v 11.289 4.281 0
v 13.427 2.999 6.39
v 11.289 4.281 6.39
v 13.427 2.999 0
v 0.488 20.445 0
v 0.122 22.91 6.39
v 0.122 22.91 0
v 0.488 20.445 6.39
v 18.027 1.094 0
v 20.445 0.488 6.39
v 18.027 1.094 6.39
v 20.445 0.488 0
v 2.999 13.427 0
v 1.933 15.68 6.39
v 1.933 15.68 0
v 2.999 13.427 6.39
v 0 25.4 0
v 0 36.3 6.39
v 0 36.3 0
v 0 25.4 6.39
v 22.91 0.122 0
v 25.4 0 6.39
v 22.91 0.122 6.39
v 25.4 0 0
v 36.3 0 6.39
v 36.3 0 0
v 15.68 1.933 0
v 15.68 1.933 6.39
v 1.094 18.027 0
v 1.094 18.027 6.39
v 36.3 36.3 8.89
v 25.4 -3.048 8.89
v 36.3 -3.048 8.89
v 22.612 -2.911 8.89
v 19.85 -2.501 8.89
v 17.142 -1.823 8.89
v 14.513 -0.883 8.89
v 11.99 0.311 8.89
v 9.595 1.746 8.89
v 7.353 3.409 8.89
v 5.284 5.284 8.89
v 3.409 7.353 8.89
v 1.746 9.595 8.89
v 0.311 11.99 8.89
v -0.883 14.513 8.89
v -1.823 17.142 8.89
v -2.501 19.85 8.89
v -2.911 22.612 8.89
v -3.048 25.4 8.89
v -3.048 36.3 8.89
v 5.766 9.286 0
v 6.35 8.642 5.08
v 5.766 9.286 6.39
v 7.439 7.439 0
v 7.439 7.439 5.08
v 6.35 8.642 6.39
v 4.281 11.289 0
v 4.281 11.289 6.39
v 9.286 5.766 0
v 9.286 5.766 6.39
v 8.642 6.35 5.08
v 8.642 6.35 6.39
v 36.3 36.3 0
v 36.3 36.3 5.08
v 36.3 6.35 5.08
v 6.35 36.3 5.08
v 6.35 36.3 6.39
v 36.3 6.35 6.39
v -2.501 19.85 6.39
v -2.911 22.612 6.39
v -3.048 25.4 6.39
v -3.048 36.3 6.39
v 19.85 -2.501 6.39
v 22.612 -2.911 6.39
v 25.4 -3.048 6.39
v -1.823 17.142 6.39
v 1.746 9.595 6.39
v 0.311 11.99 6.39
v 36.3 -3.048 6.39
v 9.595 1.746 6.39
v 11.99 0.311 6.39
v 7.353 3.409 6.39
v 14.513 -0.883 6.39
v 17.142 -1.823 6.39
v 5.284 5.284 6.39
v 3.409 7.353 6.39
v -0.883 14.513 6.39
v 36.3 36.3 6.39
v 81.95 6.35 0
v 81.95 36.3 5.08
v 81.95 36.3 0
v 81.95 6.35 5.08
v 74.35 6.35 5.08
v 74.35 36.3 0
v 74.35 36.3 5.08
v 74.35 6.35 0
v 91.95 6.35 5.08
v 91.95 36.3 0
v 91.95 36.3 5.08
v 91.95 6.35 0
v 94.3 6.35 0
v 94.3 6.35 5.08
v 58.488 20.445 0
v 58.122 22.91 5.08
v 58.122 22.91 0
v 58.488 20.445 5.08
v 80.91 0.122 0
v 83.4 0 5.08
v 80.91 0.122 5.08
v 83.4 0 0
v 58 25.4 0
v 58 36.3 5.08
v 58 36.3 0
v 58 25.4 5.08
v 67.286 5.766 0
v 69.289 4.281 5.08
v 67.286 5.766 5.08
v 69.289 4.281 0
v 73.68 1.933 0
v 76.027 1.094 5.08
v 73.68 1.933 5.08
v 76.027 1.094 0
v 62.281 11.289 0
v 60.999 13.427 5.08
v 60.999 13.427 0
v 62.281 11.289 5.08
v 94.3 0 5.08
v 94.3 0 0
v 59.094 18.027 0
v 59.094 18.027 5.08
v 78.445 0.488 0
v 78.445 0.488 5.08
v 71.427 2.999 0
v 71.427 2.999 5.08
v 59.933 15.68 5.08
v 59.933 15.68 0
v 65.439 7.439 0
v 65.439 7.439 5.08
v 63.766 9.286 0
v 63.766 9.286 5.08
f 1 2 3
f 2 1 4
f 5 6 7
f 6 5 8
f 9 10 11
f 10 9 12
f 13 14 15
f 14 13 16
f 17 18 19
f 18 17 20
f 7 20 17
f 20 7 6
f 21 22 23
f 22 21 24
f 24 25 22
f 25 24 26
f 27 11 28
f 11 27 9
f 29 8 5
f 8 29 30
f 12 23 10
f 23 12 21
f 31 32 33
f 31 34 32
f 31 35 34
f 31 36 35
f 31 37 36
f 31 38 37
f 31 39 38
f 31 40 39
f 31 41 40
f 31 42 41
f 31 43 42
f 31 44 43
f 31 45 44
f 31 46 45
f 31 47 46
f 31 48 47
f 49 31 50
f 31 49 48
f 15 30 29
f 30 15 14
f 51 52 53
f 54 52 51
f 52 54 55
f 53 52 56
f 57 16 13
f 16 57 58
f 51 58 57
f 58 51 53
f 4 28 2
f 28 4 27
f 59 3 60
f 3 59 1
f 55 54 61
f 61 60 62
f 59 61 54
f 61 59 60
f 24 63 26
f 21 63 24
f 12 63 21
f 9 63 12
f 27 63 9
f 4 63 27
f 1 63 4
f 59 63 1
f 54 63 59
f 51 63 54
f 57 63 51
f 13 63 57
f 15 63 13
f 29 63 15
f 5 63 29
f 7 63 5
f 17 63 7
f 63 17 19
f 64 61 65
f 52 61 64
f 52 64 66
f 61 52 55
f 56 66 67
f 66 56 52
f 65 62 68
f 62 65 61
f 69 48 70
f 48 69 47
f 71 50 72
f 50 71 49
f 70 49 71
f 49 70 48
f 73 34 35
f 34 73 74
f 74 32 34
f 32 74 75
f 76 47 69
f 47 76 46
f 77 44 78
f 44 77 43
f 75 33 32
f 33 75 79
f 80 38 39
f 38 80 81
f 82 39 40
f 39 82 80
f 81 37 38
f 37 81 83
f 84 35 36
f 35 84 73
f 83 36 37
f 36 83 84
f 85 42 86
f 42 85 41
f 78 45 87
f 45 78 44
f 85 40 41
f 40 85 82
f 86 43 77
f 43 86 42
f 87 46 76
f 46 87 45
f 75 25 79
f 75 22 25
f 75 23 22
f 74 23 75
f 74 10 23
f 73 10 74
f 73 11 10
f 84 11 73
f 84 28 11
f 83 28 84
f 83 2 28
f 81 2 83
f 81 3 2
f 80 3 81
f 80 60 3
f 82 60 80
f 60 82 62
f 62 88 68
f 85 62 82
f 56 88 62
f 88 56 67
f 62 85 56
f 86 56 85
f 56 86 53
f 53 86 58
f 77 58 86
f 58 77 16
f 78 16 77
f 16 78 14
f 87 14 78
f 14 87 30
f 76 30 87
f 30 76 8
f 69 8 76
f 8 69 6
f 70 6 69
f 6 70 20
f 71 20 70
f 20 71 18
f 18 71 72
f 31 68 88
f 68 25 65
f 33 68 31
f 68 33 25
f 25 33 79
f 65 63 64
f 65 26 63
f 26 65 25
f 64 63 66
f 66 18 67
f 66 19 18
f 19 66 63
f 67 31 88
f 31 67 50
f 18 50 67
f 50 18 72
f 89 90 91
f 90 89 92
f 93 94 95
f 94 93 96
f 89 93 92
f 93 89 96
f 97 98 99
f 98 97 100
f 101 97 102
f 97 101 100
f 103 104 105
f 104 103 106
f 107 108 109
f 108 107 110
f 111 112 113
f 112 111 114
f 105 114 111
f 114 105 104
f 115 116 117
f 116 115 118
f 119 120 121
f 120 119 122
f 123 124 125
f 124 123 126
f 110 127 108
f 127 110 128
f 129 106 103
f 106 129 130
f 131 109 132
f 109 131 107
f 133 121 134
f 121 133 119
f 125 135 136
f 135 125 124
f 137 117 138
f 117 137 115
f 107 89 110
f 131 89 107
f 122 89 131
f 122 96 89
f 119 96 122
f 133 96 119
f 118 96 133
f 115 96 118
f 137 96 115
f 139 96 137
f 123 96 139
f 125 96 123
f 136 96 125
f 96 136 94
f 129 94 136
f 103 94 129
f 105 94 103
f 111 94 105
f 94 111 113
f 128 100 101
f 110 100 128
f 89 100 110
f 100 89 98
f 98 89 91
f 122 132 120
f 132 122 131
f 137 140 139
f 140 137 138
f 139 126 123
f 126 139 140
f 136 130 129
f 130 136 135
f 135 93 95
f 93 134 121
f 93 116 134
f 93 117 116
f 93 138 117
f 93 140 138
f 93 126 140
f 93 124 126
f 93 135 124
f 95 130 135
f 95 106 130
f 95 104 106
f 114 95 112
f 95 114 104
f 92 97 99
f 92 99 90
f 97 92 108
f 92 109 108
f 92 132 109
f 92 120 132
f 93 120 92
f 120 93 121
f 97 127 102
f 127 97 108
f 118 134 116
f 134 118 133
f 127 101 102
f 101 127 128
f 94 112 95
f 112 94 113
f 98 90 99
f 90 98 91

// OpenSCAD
// file: model-forge/model-forge/tray.scad
// model-forge/tray.scad — rounded-corner outer panel with a recessed
// inset pocket (e.g. a "cooking dish" recess): a raised rim around the
// edge, floor thickness under the pocket, and an optional thin lip
// flange around the base — sized to slide into a support-rail groove
// (like the wooden rails inside the real Tiny Land oven cavity) rather
// than just resting loose.
//
//   use <model-forge/tray.scad>
//   rounded_tray(outer_width=285.75, outer_height=228.6, corner_radius=25.4,
//                floor_thickness=5.08, rim_height=3.81, inset_margin=6.35,
//                lip_width=3, lip_thickness=2);
//
// Shape: outer_width x outer_height slab, rounded corners (corner_radius),
// total height = floor_thickness + rim_height. A pocket is cut from the
// top, inset_margin in from every edge, cutting down through rim_height
// and stopping at floor_thickness from the bottom — so floor_thickness is
// what's left under the pocket, rim_height is how tall the surrounding
// wall stands above the pocket floor.
//
// The lip (lip_width/lip_thickness) is a thin flange at the TOP of the
// rim (from total_height-lip_thickness to total_height), sticking out
// lip_width beyond the main body on every side — corrected 2026-09-11
// per feedback on the real rail photo: the groove is near the top of the
// cavity wall, not the bottom. Both default to 0 (no lip) so existing
// calls keep working unchanged.

// hull-of-4-circles rounded rect — much faster to render than a
// minkowski-based approach for this shape (no minkowski sum needed).
module rounded_rect_2d(w, h, r) {
  hull() {
    translate([r, r]) circle(r = r, $fn = 64);
    translate([w - r, r]) circle(r = r, $fn = 64);
    translate([r, h - r]) circle(r = r, $fn = 64);
    translate([w - r, h - r]) circle(r = r, $fn = 64);
  }
}

module rounded_tray(
  outer_width,
  outer_height,
  corner_radius,
  floor_thickness,
  rim_height,
  inset_margin,
  lip_width = 0,
  lip_thickness = 0
) {
  total_height = floor_thickness + rim_height;

  union() {
    if (lip_width > 0 && lip_thickness > 0) {
      translate([-lip_width, -lip_width, total_height - lip_thickness])
        linear_extrude(height = lip_thickness)
          rounded_rect_2d(outer_width + 2 * lip_width, outer_height + 2 * lip_width, corner_radius + lip_width);
    }
    difference() {
      linear_extrude(height = total_height)
        rounded_rect_2d(outer_width, outer_height, corner_radius);
      translate([inset_margin, inset_margin, floor_thickness])
        cube([outer_width - 2 * inset_margin, outer_height - 2 * inset_margin, rim_height + 1]);
    }
  }
}
// file: model-forge/grate.scad
// model-forge/grate.scad — rounded-corner panel cut into an oven-rack-
// style bar grate: a solid frame border, parallel bars across the
// interior with open gaps between them.
//
//   use <model-forge/grate.scad>
//   oven_grate(outer_width=285.75, outer_height=228.6, corner_radius=25.4,
//              thickness=5.08, frame_width=6.35, bar_width=10, gap_width=7.6);
//
// Bars run parallel to the height (vertical bars spanning the width),
// starting and ending with a solid bar against the frame — real oven
// racks don't have a gap right at the edge. Spacing is pitch-based
// (bar_width + gap_width repeating); it won't divide the interior
// perfectly evenly on every size, so the last bar absorbs any leftover
// width. Tune bar_width/gap_width and re-render if that's visible.
use <model-forge/tray.scad> // rounded_rect_2d

module oven_grate(outer_width, outer_height, corner_radius, thickness, frame_width, bar_width, gap_width) {
  inner_width = outer_width - 2 * frame_width;
  inner_height = outer_height - 2 * frame_width;
  pitch = bar_width + gap_width;
  n_gaps = floor((inner_width - bar_width) / pitch);

  difference() {
    linear_extrude(height = thickness)
      rounded_rect_2d(outer_width, outer_height, corner_radius);
    for (i = [0 : n_gaps - 1]) {
      x = frame_width + bar_width + i * pitch;
      translate([x, frame_width, -1])
        cube([gap_width, inner_height, thickness + 2]);
    }
  }
}
// file: model-forge/tray.scad
// model-forge/tray.scad — rounded-corner outer panel with a recessed
// inset pocket (e.g. a "cooking dish" recess): a raised rim around the
// edge, floor thickness under the pocket, and an optional thin lip
// flange around the base — sized to slide into a support-rail groove
// (like the wooden rails inside the real Tiny Land oven cavity) rather
// than just resting loose.
//
//   use <model-forge/tray.scad>
//   rounded_tray(outer_width=285.75, outer_height=228.6, corner_radius=25.4,
//                floor_thickness=5.08, rim_height=3.81, inset_margin=6.35,
//                lip_width=3, lip_thickness=2);
//
// Shape: outer_width x outer_height slab, rounded corners (corner_radius),
// total height = floor_thickness + rim_height. A pocket is cut from the
// top, inset_margin in from every edge, cutting down through rim_height
// and stopping at floor_thickness from the bottom — so floor_thickness is
// what's left under the pocket, rim_height is how tall the surrounding
// wall stands above the pocket floor.
//
// The lip (lip_width/lip_thickness) is a thin flange at the TOP of the
// rim (from total_height-lip_thickness to total_height), sticking out
// lip_width beyond the main body on every side — corrected 2026-09-11
// per feedback on the real rail photo: the groove is near the top of the
// cavity wall, not the bottom. Both default to 0 (no lip) so existing
// calls keep working unchanged.

// hull-of-4-circles rounded rect — much faster to render than a
// minkowski-based approach for this shape (no minkowski sum needed).
module rounded_rect_2d(w, h, r) {
  hull() {
    translate([r, r]) circle(r = r, $fn = 64);
    translate([w - r, r]) circle(r = r, $fn = 64);
    translate([r, h - r]) circle(r = r, $fn = 64);
    translate([w - r, h - r]) circle(r = r, $fn = 64);
  }
}

module rounded_tray(
  outer_width,
  outer_height,
  corner_radius,
  floor_thickness,
  rim_height,
  inset_margin,
  lip_width = 0,
  lip_thickness = 0
) {
  total_height = floor_thickness + rim_height;

  union() {
    if (lip_width > 0 && lip_thickness > 0) {
      translate([-lip_width, -lip_width, total_height - lip_thickness])
        linear_extrude(height = lip_thickness)
          rounded_rect_2d(outer_width + 2 * lip_width, outer_height + 2 * lip_width, corner_radius + lip_width);
    }
    difference() {
      linear_extrude(height = total_height)
        rounded_rect_2d(outer_width, outer_height, corner_radius);
      translate([inset_margin, inset_margin, floor_thickness])
        cube([outer_width - 2 * inset_margin, outer_height - 2 * inset_margin, rim_height + 1]);
    }
  }
}
// main file
// Tiny Land oven insert — lip fit-test coupons. Small, fast-printing
// crops taken directly out of the REAL tray/grate geometry (not a
// separately-modeled approximation) via intersection() with a small box,
// so what you test-fit against the oven cavity's support rail is exactly
// the lip that will ship on the full parts. Two coupons print at once:
// one corner of the tray, one corner of the grate — a corner crop shows
// BOTH lip_width (long edge) and end_lip_width (short edge) in a single
// piece, joined by the rounded corner.
//
// Corner, not a straight edge: an edge-middle crop of the grate falls
// apart into loose disconnected bar fragments (verified via trimesh —
// only the frame's un-gapped border band along each edge actually ties
// the bars together, and a straight-edge-middle crop misses the
// perpendicular band). A corner crop always includes both perimeter
// frame bands, so it stays one connected, printable piece.
//
// Print this, press it into the real rail groove, confirm lip_thickness_mm
// fits (<=3mm), then dial in oven-tray.scad / oven-grate.scad and iterate.
use <model-forge/tray.scad>
use <model-forge/grate.scad>

/* [Full-part dimensions — keep in sync with oven-tray.scad / oven-grate.scad] */
outer_width_in  = 11.25;
outer_height_in = 9;
corner_radius_in = 1;

/* [Tray pocket] */
floor_thickness_mm = 5.08;
rim_height_mm       = 3.81;
inset_margin_mm      = 6.35;

/* [Grate bars] */
grate_thickness_mm   = 5.08;
frame_width_mm       = 6.35;
bar_width_mm         = 10;
gap_width_mm         = 7.6;

/* [Lip — slides into the oven cavity's support-rail groove] */
lip_width_in     = 0.12; // [0:0.01:1]  long (top/bottom) edges
end_lip_width_in = 0.5;  // [0:0.01:1]  short (left/right) edges
lip_thickness_mm = 2.5;  // [0.5:0.1:3]  must be <=3mm to fit the real rail; 2.5mm is the sweet spot

/* [Coupon] */
coupon_size_mm = 50; // [20:5:100]  edge length of each cropped square test piece
coupon_gap_mm  = 8;  // [2:1:30]    spacing between the 2 coupons on the plate

IN_TO_MM = 25.4;
outer_w = outer_width_in * IN_TO_MM;
outer_h = outer_height_in * IN_TO_MM;
CROP_TALL = 100; // taller than any real part height — just needs to fully cover it

module full_tray() {
  rounded_tray(
    outer_width     = outer_w,
    outer_height    = outer_h,
    corner_radius   = corner_radius_in * IN_TO_MM,
    floor_thickness = floor_thickness_mm,
    rim_height      = rim_height_mm,
    inset_margin    = inset_margin_mm,
    lip_width       = lip_width_in * IN_TO_MM,
    end_lip_width   = end_lip_width_in * IN_TO_MM,
    lip_thickness   = lip_thickness_mm
  );
}

module full_grate() {
  oven_grate(
    outer_width   = outer_w,
    outer_height  = outer_h,
    corner_radius = corner_radius_in * IN_TO_MM,
    thickness     = grate_thickness_mm,
    frame_width   = frame_width_mm,
    bar_width     = bar_width_mm,
    gap_width     = gap_width_mm,
    lip_width     = lip_width_in * IN_TO_MM,
    end_lip_width = end_lip_width_in * IN_TO_MM,
    lip_thickness = lip_thickness_mm
  );
}

// Crop a coupon_size x coupon_size square out of the bottom-left corner
// (X=0 short edge meets Y=0 long edge) — shows both lip_width and
// end_lip_width, joined by the rounded corner, as one connected piece.
//
// Bug fixed 2026-09-11: the crop window used to start at a hardcoded
// (-1,-1), which sits INSIDE the lip's own overhang — the lip flares out
// to NEGATIVE x/y (see tray.scad's lip_ring translate([-ew,-lip_width])),
// so most of end_lip_width's overhang was silently cropped away before
// it ever reached the printed coupon. margin below starts the window at
// the lip's true outer reach instead, so the full overhang prints.
module corner_crop() {
  margin = max(lip_width_in, end_lip_width_in) * IN_TO_MM + 1;
  intersection() {
    children(0);
    translate([-margin, -margin, -1])
      cube([coupon_size_mm, coupon_size_mm, CROP_TALL]);
  }
}

step = coupon_size_mm + coupon_gap_mm;

translate([0, 0, 0])    corner_crop() full_tray();
translate([step, 0, 0]) corner_crop() full_grate();
